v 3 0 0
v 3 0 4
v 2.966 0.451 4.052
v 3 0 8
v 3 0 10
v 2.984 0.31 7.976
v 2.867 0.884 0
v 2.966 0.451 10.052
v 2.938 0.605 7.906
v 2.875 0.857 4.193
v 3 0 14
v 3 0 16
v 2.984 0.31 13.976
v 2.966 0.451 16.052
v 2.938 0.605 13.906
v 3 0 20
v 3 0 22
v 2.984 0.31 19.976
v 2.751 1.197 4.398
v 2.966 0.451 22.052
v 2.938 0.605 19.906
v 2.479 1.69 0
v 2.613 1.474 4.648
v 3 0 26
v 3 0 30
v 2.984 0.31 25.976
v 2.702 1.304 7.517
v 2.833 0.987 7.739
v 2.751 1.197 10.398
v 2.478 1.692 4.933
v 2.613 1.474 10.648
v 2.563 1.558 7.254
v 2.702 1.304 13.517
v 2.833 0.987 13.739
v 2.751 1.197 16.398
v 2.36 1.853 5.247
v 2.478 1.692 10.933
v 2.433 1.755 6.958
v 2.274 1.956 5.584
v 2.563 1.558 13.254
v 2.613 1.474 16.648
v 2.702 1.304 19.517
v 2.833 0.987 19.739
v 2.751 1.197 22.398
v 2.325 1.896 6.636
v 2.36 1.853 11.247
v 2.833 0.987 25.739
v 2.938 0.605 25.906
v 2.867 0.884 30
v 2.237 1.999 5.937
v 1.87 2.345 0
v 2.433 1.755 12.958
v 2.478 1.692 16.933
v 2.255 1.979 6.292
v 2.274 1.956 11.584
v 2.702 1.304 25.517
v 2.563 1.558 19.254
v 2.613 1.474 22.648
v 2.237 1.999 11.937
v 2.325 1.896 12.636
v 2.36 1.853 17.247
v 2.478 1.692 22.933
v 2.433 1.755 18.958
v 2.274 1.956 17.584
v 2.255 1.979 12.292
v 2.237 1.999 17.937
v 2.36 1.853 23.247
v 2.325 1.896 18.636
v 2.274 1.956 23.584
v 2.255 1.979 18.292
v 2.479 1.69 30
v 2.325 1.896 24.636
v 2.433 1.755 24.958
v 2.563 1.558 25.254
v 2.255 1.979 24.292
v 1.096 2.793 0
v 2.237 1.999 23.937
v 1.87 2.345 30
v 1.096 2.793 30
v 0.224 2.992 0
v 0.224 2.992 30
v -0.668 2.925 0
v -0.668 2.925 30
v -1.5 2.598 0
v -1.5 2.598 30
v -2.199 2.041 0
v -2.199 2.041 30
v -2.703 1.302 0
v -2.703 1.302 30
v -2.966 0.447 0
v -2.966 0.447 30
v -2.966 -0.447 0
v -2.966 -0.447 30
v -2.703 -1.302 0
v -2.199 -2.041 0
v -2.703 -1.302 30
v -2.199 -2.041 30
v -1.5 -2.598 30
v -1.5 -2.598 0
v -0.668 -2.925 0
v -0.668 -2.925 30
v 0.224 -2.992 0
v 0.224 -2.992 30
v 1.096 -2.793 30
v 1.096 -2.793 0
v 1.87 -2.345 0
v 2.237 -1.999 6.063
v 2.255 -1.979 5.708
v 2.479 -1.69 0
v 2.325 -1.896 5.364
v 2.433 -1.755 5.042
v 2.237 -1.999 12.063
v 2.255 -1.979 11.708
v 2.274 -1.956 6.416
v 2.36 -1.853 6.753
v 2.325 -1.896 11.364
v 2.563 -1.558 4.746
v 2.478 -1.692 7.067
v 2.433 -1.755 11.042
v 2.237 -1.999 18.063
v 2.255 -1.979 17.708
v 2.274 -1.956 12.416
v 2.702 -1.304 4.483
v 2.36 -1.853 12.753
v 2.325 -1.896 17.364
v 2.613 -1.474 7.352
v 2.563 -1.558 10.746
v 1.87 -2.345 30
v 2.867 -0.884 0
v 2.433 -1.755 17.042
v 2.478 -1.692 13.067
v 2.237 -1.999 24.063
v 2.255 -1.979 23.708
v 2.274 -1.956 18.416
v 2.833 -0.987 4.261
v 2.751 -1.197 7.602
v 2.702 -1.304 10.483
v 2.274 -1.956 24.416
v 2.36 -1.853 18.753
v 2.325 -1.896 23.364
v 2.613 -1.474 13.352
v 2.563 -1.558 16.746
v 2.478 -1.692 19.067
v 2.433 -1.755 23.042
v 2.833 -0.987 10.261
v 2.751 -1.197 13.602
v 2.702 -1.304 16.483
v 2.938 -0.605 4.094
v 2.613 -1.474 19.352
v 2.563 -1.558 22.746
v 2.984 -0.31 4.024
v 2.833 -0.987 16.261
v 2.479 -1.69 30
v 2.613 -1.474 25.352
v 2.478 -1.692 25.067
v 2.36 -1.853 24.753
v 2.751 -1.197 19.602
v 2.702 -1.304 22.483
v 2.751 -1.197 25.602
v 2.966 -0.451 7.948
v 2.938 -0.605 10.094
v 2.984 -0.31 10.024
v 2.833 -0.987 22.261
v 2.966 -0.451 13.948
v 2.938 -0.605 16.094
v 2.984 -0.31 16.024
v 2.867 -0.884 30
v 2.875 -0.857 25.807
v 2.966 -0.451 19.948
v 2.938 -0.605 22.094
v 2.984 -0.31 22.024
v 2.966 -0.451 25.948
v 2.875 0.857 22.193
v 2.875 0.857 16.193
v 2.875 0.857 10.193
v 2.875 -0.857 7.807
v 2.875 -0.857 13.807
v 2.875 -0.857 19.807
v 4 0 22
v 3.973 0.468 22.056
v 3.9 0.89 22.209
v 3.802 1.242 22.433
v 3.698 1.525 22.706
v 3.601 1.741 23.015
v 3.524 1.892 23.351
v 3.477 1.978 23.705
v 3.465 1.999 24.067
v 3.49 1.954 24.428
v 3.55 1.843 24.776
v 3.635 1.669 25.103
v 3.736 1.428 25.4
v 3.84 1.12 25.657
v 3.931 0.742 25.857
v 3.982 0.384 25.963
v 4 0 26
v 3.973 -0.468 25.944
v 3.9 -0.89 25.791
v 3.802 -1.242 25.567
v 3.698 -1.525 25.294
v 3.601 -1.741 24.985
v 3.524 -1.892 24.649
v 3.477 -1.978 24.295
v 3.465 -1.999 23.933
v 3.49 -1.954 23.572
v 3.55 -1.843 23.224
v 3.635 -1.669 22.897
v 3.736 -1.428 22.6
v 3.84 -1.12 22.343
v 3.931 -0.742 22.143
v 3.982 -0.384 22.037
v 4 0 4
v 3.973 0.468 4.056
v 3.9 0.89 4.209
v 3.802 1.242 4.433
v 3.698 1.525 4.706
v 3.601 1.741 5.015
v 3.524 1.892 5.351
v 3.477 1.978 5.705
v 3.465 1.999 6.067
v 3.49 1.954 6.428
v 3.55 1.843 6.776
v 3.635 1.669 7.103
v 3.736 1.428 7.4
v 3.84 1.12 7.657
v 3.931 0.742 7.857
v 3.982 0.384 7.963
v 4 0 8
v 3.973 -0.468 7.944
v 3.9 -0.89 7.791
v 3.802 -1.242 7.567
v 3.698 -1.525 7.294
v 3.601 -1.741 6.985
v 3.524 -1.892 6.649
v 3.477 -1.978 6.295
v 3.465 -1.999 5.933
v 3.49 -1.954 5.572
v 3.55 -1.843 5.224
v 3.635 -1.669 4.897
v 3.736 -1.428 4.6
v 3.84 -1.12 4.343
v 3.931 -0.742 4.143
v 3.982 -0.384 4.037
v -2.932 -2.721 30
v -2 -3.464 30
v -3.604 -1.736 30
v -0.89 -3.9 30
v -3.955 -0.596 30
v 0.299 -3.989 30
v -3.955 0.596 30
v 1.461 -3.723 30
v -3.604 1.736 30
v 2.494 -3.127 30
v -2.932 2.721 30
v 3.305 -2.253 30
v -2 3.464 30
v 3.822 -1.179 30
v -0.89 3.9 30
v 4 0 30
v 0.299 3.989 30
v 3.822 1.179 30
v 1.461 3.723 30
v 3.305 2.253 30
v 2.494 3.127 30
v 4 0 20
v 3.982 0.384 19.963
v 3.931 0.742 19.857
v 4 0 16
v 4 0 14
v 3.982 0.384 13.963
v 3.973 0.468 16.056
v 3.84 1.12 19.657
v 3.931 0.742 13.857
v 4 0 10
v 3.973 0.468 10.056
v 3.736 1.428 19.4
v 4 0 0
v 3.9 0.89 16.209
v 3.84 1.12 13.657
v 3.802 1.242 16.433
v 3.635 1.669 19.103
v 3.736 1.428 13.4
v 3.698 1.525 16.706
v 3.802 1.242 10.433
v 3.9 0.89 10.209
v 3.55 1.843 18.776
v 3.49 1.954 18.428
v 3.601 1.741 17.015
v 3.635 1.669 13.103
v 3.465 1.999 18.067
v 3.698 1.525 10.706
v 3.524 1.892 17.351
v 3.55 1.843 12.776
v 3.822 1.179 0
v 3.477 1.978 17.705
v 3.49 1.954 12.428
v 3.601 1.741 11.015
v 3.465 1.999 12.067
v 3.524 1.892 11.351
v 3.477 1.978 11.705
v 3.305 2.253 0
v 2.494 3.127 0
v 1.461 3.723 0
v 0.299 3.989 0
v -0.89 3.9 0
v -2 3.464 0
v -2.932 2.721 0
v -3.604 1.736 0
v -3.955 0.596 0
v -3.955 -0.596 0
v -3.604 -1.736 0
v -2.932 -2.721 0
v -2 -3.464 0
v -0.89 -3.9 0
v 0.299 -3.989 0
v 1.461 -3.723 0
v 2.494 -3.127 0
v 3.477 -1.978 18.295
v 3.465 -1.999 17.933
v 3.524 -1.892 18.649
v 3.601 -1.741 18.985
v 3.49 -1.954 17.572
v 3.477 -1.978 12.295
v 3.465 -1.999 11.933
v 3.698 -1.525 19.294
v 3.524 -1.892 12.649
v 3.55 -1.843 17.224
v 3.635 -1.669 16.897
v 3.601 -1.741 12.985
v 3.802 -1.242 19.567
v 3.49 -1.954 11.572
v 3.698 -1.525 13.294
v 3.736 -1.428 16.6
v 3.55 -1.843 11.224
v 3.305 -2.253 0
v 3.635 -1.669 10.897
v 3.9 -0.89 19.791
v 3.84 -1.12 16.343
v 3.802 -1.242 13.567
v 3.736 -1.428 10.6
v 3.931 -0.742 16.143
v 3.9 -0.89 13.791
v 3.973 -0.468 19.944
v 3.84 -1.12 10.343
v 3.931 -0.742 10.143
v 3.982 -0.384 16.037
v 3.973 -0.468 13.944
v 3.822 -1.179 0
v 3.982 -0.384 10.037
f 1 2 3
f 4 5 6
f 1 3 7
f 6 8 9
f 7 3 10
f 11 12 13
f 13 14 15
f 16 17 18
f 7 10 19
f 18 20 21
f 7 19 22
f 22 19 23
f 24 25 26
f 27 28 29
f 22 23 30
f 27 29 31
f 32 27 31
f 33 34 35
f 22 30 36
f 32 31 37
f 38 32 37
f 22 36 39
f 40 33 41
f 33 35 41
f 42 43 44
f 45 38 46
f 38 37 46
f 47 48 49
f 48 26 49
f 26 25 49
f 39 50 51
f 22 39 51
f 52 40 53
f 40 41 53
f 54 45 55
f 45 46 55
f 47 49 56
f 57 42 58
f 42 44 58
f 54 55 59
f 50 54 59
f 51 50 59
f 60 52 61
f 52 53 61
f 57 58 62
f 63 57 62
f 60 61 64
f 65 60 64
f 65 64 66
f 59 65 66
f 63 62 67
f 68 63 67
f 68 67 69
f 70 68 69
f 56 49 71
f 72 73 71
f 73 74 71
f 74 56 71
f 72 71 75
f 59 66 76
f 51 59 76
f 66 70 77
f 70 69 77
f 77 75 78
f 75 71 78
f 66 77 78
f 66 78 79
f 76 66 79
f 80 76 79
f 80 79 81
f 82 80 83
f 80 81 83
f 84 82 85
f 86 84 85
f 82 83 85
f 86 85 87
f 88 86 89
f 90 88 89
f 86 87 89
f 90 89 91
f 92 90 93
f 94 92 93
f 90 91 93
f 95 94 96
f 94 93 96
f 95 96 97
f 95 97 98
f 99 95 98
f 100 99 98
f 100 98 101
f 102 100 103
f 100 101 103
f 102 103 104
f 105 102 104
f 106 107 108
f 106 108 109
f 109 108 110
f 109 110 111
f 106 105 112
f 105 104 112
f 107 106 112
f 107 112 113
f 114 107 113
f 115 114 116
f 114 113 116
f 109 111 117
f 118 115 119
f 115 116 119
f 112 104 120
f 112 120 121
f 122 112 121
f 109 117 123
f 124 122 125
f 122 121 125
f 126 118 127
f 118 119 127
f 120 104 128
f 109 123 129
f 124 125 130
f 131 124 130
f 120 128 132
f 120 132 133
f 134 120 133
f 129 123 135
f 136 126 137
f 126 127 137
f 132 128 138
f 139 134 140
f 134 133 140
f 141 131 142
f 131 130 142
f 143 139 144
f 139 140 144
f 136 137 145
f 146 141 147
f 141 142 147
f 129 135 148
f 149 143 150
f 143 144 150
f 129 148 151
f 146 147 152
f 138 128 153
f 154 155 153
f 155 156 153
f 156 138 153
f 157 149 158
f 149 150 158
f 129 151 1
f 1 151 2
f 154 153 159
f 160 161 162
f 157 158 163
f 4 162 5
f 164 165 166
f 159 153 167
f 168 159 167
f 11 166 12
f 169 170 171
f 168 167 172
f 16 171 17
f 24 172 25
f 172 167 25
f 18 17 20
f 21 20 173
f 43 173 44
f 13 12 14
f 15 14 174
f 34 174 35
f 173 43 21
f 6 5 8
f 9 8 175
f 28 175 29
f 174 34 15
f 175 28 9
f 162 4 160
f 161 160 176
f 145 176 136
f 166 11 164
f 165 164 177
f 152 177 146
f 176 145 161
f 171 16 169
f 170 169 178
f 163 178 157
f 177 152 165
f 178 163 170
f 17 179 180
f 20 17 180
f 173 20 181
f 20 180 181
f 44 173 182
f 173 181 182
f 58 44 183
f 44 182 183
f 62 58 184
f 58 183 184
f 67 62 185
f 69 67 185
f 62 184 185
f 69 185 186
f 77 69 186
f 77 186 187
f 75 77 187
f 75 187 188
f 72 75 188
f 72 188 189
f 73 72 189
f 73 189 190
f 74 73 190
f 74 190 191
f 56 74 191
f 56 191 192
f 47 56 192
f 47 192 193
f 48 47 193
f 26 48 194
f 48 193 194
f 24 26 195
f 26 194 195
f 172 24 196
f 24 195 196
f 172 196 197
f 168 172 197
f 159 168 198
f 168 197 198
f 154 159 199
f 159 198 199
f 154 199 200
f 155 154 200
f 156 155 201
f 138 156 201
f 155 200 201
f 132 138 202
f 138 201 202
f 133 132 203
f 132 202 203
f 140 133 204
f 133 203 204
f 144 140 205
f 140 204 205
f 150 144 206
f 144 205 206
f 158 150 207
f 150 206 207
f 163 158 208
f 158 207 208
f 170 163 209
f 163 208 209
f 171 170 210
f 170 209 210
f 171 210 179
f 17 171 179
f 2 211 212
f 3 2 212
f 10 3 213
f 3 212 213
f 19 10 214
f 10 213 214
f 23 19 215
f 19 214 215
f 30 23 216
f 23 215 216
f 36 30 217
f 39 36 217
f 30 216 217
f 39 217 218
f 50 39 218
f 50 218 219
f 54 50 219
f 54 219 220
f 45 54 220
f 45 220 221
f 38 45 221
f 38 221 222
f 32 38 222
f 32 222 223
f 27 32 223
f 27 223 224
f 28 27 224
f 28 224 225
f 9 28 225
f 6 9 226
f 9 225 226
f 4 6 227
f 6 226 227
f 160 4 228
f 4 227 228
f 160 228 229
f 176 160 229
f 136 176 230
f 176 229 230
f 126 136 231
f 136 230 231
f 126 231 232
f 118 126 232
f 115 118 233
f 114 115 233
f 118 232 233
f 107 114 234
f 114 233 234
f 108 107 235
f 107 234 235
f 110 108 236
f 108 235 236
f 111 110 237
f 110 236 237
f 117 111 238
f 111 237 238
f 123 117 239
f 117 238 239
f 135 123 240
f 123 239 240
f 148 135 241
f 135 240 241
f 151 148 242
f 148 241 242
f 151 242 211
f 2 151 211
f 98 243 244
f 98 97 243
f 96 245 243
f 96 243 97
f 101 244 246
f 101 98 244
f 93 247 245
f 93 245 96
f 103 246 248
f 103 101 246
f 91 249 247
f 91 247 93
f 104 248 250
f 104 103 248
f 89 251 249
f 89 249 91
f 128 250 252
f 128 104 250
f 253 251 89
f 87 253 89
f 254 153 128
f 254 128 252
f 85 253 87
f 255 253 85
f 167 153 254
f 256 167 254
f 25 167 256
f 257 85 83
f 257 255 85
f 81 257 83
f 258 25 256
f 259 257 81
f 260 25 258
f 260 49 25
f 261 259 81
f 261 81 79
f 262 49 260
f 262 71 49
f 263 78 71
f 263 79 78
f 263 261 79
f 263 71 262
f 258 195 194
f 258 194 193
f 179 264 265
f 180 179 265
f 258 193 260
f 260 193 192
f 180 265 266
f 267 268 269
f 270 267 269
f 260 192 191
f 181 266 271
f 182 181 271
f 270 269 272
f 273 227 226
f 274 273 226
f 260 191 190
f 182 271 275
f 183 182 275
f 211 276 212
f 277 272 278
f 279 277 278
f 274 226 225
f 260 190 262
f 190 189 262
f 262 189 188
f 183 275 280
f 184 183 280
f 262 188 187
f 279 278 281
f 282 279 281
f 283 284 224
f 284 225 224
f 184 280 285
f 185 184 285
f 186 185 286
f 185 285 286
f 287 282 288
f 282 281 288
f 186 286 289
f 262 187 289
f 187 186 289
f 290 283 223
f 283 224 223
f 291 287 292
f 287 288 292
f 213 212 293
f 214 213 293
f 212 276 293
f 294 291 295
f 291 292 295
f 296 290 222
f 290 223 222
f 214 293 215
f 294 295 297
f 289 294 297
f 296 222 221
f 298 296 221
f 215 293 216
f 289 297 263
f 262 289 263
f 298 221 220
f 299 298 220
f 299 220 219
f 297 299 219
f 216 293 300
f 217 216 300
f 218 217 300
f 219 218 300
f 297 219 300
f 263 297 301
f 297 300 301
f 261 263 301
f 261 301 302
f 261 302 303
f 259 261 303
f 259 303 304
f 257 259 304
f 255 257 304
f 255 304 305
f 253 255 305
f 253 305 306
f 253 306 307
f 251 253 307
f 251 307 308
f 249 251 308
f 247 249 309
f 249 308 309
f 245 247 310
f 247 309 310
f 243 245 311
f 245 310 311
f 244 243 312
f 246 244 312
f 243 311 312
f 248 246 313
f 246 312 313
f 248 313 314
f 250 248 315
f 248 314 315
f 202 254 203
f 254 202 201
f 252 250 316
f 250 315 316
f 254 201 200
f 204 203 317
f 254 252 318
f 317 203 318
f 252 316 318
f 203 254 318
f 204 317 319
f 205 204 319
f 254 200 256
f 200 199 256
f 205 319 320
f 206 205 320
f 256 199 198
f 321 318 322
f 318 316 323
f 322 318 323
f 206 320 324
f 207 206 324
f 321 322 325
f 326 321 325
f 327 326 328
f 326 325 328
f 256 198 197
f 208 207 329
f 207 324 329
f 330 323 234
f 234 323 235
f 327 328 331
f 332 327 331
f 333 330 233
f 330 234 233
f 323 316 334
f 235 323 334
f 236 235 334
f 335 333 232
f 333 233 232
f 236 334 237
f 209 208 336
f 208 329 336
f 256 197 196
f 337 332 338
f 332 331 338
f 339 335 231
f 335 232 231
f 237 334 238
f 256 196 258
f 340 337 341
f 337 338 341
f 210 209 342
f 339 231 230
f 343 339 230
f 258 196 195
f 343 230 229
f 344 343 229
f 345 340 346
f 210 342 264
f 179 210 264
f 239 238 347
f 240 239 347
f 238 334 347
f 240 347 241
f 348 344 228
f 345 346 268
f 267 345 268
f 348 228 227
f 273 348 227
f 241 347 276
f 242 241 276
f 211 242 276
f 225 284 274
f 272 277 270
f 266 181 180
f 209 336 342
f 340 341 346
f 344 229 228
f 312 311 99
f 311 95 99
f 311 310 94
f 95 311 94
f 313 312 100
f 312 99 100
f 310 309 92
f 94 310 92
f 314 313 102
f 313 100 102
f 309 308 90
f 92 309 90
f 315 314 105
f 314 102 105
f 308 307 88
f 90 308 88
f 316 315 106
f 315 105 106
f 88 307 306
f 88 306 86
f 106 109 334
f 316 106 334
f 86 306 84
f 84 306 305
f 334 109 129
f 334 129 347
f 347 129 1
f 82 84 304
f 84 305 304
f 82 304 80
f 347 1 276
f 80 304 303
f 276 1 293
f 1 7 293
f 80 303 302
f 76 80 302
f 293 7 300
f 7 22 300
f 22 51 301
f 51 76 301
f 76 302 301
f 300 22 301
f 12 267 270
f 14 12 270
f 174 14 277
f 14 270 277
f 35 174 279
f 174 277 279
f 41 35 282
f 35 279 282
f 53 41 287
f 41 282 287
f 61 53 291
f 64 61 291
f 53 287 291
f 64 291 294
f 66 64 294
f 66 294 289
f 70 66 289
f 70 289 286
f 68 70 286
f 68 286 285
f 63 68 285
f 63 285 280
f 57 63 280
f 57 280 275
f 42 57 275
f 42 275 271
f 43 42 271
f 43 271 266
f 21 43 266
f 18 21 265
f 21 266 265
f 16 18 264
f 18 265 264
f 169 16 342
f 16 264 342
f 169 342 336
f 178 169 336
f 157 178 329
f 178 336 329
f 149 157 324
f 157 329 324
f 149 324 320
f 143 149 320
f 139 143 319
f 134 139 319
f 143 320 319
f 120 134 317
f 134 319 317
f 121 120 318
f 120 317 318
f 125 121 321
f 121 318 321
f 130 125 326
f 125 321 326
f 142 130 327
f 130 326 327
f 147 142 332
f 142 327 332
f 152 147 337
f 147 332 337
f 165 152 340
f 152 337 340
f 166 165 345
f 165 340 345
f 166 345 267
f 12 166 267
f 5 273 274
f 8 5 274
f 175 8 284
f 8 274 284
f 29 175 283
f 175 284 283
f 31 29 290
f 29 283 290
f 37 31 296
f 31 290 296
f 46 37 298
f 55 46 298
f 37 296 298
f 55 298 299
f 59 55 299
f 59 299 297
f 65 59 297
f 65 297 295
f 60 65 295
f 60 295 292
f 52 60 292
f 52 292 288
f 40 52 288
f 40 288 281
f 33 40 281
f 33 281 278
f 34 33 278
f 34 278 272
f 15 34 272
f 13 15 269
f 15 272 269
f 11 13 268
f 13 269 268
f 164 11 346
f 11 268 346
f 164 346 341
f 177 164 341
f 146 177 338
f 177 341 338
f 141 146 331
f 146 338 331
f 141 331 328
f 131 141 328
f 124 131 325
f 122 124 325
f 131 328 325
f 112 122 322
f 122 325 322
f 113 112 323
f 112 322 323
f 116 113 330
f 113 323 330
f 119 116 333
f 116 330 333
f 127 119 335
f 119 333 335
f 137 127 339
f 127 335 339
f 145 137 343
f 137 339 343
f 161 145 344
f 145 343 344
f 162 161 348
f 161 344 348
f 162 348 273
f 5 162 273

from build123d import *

# Parameters (mm, degrees)
SKETCH1_R           = 4
BOSS_EXTRUDE1_DEPTH = 30
SKETCH2_R           = 3
CUT_EXTRUDE1_DEPTH  = 31
CUT_EXTRUDE2_START  = 5
SKETCH3_R           = 2
CUT_EXTRUDE2_DEPTH  = 4


with BuildPart() as part:
    # Sketch1 → Boss-Extrude1 (new body)
    with BuildSketch(Plane.XY):
        Circle(SKETCH1_R)
    extrude(amount=BOSS_EXTRUDE1_DEPTH)

    # Sketch2 → Cut-Extrude1 (cut, through all)
    with BuildSketch(Plane.XY.offset(30)):
        Circle(SKETCH2_R)
    extrude(amount=-CUT_EXTRUDE1_DEPTH, mode=Mode.SUBTRACT)

    # Sketch3 → Cut-Extrude2 (cut)
    with BuildSketch(Plane(origin=(0, 0, 0), x_dir=(0, 0, -1), z_dir=(1, 0, 0)).offset(CUT_EXTRUDE2_START)):
        with Locations((-6, 0)):
            Circle(SKETCH3_R)
        with Locations((-12, 0)):
            Circle(SKETCH3_R)
        with Locations((-18, 0)):
            Circle(SKETCH3_R)
        with Locations((-24, 0)):
            Circle(SKETCH3_R)
    extrude(amount=-CUT_EXTRUDE2_DEPTH, mode=Mode.SUBTRACT)


solid = part.part
